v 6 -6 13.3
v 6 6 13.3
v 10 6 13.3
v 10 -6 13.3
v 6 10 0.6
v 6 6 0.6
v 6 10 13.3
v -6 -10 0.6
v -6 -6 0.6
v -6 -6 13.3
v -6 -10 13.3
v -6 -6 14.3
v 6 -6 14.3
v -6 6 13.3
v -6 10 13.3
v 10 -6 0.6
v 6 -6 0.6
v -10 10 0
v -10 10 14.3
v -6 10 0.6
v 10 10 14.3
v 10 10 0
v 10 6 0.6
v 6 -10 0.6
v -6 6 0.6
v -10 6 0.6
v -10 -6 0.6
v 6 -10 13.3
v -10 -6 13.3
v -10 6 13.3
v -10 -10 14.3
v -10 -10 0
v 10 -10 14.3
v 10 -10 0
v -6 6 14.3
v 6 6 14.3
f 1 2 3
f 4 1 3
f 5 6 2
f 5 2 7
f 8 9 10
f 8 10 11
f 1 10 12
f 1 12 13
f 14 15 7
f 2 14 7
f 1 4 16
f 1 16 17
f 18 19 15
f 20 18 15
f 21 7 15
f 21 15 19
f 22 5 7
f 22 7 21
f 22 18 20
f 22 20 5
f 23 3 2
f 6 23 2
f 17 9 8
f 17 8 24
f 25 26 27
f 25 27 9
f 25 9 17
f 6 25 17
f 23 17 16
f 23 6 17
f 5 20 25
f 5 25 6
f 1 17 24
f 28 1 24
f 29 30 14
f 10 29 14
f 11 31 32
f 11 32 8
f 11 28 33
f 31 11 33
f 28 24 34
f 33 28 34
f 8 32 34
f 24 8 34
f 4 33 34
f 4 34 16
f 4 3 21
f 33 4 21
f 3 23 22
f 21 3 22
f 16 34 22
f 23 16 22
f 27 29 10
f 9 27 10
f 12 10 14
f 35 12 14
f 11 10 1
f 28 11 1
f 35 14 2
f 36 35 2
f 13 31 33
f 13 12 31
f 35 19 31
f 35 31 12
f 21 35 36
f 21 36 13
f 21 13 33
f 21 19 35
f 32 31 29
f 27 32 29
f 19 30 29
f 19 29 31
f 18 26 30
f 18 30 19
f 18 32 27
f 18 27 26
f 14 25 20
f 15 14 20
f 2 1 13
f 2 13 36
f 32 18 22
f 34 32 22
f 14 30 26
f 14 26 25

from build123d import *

# Parameters (mm, degrees)
F0_W     = 20
F0_H     = 20
F1_DEPTH = 0.6
F2_W     = 4
F2_H     = 4
F3_DEPTH = 12.7
F6_W     = 20
F6_H     = 20
F6_W_2   = 12
F6_H_2   = 12
F7_DEPTH = 1


with BuildPart() as f1:
    # F0 (on Top) → F1 (new body)
    with BuildSketch(Plane.XY):
        Rectangle(F0_W, F0_H)
    extrude(amount=F1_DEPTH)

    # F2 (on face) → F3 (join)
    with BuildSketch(Plane.XY.offset(0.6)):
        with Locations((-8, 8)):
            Rectangle(F2_W, F2_H)
    extrude(amount=F3_DEPTH)

    # F4: F1 across plane


with BuildPart() as f1_1:
    add(f1.part)
    add(f1.part.mirror(Plane.YZ))

    # F5: F1 across plane


with BuildPart() as f1_2:
    add(f1_1.part)
    add(f1_1.part.mirror(Plane.XZ))

    # F6 (on face) → F7 (join)
    with BuildSketch(Plane.XY.offset(13.3)):
        Rectangle(F6_W, F6_H)
        Rectangle(F6_W_2, F6_H_2, mode=Mode.SUBTRACT)
    extrude(amount=F7_DEPTH)


solid = f1_2.part
